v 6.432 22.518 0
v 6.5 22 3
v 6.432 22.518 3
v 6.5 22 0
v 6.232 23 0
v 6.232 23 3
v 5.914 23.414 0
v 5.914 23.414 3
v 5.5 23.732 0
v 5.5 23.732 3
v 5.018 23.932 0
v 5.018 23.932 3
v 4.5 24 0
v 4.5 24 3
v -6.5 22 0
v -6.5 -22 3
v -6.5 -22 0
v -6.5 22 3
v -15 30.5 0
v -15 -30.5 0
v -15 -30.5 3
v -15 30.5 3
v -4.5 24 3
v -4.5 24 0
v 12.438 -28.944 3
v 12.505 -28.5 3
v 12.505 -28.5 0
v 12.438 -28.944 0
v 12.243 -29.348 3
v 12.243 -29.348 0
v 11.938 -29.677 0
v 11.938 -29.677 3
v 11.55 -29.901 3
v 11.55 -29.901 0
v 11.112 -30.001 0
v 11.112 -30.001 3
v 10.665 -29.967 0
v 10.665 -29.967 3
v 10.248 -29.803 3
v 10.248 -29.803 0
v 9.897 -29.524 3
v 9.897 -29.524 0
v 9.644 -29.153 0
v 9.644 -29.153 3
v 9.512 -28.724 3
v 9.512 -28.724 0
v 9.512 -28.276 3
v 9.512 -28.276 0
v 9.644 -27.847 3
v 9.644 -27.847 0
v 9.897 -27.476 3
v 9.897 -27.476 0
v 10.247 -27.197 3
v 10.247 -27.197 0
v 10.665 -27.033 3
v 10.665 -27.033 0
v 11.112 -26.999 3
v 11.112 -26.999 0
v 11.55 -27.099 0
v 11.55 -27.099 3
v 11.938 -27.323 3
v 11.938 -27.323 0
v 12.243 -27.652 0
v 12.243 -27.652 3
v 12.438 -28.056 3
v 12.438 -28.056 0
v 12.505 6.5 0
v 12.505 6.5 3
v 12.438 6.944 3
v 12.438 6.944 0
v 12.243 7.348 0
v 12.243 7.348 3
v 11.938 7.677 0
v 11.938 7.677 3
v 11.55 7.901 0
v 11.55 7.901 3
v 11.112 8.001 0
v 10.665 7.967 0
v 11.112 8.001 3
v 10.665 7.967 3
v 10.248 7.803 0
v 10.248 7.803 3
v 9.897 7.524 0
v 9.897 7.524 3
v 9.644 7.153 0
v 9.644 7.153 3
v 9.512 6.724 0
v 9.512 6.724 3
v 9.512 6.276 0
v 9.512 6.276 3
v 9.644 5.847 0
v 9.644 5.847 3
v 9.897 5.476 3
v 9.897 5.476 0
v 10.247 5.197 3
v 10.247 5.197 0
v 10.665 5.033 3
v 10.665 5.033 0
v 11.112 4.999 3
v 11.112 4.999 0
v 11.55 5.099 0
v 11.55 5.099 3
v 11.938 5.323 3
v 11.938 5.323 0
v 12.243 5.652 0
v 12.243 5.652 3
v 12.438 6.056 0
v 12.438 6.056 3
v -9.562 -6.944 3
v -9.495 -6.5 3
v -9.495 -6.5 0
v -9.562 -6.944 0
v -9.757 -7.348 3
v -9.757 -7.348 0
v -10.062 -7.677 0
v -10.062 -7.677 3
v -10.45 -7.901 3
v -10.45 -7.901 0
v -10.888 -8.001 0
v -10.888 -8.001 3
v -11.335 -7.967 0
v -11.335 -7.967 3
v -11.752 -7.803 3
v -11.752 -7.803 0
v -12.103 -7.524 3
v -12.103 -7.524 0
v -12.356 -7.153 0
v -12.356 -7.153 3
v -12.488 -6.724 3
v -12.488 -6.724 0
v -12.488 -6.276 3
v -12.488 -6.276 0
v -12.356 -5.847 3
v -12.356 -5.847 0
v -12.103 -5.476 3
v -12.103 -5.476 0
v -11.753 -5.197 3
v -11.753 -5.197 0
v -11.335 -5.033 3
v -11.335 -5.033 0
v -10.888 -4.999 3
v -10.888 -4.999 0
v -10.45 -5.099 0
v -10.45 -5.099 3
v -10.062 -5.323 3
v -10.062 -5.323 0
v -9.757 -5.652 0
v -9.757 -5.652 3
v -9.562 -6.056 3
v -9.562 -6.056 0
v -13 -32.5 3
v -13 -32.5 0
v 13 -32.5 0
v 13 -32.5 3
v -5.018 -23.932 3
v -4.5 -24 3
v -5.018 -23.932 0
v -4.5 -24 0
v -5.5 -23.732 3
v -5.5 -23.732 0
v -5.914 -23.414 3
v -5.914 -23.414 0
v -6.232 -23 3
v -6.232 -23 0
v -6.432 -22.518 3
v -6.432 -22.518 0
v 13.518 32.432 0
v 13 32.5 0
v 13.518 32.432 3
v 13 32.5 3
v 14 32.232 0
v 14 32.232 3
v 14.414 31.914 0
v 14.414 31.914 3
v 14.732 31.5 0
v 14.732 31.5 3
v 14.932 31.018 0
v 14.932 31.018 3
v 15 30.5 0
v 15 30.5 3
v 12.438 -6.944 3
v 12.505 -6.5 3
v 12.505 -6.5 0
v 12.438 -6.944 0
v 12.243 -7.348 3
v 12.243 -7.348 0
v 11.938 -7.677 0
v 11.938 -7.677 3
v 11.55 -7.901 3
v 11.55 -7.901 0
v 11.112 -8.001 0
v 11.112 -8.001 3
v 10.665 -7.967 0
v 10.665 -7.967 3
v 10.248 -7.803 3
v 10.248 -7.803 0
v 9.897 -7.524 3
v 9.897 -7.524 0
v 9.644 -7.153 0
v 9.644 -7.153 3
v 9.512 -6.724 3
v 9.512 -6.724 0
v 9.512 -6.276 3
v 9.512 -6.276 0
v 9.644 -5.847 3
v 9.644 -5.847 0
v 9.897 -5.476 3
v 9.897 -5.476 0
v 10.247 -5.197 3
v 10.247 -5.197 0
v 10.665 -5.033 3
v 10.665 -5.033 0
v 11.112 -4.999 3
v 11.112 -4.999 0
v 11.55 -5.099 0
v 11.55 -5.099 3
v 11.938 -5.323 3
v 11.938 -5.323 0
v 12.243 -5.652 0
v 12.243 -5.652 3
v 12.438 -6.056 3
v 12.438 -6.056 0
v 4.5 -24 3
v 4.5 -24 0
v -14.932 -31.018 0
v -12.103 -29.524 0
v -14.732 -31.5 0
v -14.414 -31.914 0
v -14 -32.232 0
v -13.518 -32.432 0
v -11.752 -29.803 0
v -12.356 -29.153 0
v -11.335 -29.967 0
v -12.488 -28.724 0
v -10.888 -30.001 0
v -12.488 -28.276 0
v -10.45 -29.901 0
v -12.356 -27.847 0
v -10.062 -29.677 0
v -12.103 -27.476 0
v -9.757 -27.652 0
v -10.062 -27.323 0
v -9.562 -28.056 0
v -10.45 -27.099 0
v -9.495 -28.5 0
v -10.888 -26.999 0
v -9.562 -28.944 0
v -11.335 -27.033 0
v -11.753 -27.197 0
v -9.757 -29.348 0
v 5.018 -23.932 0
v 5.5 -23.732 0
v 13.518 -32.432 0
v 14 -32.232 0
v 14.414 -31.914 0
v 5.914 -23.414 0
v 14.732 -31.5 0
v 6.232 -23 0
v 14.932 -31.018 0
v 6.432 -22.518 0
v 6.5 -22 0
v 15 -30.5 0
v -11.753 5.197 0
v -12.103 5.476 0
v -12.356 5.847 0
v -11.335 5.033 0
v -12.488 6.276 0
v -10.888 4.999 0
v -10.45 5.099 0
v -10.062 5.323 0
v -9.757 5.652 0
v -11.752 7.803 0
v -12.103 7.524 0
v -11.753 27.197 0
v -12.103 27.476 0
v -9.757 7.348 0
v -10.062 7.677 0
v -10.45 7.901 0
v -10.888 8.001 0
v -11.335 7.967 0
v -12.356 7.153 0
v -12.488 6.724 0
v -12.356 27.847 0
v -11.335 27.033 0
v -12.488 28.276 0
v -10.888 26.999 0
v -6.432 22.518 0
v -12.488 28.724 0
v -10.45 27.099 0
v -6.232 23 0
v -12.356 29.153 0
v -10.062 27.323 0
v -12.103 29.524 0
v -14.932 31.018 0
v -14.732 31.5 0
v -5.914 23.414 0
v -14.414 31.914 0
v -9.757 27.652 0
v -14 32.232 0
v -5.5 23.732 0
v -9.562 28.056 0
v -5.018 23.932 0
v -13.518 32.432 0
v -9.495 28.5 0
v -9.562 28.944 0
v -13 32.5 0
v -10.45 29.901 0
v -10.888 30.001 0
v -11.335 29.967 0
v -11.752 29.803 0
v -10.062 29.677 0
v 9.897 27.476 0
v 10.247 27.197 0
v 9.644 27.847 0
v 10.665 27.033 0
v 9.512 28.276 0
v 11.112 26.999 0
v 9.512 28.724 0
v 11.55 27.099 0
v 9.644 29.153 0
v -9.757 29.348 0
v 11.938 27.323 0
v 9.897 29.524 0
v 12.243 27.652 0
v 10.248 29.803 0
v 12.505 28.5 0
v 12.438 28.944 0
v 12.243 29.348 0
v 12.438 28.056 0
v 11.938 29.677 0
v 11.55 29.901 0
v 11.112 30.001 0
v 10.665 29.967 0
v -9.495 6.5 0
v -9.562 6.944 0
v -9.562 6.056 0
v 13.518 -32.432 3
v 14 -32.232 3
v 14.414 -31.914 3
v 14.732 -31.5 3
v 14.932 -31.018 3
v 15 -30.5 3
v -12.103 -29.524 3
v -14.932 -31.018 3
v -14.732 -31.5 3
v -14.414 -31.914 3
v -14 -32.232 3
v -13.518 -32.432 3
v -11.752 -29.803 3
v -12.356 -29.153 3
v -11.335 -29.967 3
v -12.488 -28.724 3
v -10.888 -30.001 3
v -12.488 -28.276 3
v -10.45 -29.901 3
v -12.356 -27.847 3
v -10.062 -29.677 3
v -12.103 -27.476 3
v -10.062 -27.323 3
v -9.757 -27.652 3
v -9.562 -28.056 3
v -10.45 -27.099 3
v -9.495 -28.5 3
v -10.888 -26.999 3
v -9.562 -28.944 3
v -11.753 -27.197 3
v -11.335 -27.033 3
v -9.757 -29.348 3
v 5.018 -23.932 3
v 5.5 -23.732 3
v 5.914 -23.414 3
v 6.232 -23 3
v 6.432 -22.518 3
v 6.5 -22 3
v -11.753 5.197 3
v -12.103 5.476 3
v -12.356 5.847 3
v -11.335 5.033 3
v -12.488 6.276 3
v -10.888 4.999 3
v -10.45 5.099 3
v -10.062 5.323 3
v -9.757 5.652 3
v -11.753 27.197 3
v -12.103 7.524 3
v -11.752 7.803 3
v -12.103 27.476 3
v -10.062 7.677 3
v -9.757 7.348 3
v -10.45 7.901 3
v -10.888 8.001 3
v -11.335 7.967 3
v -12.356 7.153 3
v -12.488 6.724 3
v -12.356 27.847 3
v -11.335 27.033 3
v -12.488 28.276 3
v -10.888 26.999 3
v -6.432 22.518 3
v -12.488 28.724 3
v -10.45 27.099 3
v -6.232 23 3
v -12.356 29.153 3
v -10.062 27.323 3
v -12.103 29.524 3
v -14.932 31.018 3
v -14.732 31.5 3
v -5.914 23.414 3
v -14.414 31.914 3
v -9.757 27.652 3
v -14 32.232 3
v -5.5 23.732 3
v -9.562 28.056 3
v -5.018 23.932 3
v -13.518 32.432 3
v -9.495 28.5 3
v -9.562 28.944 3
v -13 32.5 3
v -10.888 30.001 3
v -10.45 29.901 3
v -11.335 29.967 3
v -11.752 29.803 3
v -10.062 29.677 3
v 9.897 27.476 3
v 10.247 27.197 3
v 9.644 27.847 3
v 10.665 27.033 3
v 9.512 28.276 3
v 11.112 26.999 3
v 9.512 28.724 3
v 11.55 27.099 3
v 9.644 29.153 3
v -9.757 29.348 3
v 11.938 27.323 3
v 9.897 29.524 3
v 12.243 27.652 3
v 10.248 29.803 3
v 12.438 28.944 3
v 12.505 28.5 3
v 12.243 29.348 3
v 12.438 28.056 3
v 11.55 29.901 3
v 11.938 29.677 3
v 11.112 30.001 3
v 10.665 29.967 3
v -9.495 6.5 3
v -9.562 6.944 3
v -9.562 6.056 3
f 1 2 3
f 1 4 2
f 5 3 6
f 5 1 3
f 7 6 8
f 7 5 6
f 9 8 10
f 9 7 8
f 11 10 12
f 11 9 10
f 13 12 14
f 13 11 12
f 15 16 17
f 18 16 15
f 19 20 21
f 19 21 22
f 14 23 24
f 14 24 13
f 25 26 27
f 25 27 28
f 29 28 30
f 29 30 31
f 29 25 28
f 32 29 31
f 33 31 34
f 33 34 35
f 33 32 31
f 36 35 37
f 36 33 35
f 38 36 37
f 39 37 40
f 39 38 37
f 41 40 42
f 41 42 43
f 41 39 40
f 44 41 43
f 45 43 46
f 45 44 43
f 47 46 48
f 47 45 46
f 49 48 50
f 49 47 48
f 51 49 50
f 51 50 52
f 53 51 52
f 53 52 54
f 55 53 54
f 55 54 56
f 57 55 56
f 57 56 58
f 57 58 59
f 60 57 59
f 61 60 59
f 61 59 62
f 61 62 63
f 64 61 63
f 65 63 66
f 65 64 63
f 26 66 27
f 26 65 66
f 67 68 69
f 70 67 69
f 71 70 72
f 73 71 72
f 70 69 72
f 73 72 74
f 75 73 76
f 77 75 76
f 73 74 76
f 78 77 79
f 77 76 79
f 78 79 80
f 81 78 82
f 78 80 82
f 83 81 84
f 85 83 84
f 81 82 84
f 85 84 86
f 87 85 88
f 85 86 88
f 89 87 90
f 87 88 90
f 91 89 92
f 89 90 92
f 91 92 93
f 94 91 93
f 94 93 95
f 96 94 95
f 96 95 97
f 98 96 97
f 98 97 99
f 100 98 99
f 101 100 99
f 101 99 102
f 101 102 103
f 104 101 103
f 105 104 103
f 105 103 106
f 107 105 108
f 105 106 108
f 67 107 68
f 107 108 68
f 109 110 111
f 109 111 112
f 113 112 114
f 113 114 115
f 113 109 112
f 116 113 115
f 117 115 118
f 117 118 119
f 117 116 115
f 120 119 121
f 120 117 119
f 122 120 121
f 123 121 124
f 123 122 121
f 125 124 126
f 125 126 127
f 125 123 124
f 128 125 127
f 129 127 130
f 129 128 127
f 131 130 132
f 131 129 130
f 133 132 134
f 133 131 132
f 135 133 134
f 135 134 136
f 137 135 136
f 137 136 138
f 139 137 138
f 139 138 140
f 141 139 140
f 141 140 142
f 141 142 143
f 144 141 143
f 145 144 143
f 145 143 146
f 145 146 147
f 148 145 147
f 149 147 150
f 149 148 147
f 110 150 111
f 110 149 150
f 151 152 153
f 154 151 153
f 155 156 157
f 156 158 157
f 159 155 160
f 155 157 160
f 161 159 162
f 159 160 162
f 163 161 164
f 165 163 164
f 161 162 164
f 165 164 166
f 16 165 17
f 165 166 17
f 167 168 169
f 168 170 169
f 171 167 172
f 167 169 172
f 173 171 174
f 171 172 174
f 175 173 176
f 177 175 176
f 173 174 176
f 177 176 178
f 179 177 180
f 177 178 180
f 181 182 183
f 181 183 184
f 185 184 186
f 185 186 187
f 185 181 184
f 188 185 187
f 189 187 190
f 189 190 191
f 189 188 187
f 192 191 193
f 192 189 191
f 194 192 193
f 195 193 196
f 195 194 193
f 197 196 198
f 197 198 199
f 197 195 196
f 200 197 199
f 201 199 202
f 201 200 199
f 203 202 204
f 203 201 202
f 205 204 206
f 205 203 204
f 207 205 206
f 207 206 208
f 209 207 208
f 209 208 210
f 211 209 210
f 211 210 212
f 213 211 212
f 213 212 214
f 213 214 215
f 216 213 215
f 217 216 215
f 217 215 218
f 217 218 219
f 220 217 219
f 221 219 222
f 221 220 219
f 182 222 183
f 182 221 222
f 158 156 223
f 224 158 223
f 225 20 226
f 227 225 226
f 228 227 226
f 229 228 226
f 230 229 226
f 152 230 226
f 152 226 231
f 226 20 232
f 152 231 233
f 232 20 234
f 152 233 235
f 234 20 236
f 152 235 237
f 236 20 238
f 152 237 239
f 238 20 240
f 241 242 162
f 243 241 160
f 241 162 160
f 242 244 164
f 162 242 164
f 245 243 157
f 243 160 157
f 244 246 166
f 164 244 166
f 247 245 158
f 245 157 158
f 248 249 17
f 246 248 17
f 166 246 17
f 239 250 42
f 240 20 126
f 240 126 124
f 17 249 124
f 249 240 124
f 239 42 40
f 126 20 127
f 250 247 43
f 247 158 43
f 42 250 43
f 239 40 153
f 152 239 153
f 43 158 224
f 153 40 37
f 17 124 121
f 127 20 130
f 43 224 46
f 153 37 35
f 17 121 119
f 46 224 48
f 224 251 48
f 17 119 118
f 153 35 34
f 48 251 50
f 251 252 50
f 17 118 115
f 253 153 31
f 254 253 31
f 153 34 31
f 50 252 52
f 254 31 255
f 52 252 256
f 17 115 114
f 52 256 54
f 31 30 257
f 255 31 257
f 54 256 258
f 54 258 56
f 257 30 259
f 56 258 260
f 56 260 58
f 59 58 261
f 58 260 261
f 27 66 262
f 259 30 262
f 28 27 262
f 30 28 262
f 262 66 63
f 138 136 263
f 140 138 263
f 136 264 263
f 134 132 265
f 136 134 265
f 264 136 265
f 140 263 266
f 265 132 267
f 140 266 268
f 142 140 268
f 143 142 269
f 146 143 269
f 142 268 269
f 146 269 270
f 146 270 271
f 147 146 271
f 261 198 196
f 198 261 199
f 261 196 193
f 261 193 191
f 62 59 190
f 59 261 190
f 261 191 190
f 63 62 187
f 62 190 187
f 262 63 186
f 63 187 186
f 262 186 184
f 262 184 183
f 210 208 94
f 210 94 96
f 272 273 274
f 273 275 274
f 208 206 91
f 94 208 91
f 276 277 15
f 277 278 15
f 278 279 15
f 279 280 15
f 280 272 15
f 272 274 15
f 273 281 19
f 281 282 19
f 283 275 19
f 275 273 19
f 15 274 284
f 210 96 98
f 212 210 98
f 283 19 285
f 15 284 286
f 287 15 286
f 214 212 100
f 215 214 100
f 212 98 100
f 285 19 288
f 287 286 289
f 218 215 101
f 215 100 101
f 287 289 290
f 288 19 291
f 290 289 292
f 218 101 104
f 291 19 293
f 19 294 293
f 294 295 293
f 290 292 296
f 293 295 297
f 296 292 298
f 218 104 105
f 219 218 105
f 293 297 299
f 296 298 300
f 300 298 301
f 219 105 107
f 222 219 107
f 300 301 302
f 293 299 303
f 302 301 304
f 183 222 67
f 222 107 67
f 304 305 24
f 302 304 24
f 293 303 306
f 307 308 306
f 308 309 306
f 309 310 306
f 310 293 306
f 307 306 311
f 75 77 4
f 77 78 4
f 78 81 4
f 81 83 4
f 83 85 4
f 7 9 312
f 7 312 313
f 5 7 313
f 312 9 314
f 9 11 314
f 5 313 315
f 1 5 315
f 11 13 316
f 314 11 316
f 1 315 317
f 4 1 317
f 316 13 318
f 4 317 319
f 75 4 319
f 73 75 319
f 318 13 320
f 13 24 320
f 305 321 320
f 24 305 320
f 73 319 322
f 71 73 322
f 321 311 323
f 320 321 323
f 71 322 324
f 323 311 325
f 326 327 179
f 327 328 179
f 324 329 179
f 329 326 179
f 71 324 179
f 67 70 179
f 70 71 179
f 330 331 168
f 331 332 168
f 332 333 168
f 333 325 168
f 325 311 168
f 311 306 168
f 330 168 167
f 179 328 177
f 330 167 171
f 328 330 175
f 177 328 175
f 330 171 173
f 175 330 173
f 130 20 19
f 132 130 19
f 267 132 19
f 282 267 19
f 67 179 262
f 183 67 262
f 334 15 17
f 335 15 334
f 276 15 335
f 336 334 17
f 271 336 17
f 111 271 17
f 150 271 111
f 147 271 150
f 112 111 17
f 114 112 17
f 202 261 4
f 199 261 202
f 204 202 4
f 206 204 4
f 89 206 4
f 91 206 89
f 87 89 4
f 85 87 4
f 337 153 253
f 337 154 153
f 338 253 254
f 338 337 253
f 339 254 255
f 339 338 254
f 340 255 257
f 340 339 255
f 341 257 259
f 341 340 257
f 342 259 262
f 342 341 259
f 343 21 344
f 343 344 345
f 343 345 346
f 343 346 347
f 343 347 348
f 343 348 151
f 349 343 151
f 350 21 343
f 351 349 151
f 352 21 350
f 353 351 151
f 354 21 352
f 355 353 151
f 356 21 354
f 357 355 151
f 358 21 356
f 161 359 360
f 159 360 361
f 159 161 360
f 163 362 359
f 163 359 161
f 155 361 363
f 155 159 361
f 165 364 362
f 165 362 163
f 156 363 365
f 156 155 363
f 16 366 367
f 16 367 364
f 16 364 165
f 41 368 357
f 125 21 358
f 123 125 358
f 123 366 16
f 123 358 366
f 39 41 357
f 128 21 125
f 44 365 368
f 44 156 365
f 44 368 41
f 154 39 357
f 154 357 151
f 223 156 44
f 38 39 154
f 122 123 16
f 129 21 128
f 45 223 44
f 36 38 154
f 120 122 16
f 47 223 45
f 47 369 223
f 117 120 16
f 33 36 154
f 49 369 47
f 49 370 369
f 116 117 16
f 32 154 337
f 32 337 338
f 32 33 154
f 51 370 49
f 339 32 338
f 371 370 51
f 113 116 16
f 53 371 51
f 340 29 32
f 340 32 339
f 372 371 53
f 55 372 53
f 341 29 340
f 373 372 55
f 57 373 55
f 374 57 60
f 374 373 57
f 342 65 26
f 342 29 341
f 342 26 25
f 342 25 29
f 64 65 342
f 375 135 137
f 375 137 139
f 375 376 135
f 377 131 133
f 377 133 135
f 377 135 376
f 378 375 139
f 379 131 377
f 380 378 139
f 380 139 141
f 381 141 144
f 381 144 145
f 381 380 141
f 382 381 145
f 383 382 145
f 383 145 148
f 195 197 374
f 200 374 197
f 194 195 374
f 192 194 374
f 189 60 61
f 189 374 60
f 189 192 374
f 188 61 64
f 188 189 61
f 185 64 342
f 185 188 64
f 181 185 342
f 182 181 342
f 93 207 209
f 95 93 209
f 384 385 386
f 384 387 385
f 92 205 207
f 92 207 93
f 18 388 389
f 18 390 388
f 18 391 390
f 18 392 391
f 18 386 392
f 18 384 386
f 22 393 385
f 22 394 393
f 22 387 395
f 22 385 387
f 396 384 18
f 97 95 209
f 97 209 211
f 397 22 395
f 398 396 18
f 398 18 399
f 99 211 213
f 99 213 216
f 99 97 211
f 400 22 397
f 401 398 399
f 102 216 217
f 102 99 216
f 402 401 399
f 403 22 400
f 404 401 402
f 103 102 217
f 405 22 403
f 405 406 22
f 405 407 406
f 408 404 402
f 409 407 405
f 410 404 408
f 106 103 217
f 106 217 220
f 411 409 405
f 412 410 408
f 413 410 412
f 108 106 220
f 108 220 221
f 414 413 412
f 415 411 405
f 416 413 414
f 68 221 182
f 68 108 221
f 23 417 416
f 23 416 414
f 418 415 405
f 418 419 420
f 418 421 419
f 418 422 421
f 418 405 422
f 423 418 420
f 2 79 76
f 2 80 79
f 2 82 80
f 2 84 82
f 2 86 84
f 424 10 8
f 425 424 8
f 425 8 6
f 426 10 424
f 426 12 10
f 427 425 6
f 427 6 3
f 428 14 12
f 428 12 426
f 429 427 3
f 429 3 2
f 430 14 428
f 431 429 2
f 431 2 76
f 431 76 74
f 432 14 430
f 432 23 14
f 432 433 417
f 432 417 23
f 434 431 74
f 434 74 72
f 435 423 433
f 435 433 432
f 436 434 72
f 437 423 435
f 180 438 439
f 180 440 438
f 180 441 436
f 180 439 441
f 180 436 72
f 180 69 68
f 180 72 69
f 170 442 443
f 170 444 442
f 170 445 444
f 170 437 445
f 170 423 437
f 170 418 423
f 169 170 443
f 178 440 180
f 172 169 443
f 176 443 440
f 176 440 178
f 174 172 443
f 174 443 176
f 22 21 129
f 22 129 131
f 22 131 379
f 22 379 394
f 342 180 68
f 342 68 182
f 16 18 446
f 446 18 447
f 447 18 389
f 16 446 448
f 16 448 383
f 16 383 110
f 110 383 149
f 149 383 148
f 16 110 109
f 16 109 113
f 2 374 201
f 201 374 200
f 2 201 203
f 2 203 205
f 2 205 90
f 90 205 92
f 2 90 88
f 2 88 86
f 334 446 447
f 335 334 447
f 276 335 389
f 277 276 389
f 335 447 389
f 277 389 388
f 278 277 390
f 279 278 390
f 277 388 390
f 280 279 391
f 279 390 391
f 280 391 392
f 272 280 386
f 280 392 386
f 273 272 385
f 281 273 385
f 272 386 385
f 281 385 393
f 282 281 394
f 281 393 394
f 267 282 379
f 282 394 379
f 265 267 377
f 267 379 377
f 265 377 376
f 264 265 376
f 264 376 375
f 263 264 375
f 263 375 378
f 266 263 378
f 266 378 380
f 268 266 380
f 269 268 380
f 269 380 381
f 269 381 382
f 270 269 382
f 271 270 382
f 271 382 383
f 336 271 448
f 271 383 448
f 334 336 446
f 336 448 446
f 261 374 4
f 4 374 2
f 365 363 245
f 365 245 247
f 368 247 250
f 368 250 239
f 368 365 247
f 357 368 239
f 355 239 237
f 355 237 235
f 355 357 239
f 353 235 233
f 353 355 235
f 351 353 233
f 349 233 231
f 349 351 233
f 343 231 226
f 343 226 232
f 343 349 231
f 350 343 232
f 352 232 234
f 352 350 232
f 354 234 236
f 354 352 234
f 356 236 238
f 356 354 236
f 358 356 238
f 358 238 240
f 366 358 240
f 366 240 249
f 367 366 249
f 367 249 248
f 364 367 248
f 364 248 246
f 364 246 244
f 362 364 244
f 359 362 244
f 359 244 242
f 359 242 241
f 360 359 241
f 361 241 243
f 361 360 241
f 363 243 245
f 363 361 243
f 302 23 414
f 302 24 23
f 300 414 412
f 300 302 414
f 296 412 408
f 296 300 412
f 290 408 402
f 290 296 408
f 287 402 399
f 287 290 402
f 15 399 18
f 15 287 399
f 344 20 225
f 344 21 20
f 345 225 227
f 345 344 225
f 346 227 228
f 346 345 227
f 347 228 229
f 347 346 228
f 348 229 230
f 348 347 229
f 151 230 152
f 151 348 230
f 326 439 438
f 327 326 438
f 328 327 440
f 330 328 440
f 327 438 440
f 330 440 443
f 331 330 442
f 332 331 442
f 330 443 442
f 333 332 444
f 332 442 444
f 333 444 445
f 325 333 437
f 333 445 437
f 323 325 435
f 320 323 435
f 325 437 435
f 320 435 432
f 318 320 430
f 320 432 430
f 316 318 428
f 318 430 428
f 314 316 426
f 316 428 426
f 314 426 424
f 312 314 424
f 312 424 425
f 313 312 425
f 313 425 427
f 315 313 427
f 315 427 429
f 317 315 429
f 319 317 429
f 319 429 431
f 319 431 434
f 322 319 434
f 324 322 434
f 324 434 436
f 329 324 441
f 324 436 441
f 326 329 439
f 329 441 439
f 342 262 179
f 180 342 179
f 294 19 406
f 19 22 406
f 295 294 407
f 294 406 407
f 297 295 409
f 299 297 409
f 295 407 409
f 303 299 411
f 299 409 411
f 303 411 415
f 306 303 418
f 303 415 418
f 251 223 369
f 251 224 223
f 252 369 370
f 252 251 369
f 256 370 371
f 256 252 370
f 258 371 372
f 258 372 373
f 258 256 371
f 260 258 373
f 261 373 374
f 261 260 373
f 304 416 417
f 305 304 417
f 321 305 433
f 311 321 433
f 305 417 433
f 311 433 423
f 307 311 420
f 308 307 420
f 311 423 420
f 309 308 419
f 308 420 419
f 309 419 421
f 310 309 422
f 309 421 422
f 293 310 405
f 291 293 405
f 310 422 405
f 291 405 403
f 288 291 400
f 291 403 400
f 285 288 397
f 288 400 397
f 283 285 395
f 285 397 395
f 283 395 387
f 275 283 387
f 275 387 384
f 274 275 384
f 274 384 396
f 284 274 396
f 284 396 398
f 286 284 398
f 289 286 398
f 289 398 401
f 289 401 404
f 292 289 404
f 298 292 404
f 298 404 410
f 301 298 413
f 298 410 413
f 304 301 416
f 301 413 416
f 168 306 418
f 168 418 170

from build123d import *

# Parameters (mm, degrees)
SKETCH_1_W          = 30
SKETCH_1_H          = 65
EXTRUDE_1_DEPTH     = 3
SKETCH_2_R          = 1.505
CUT_EXTRUDE_1_DEPTH = 3
FILLET_1_R          = 2
SKETCH_3_W          = 13
SKETCH_3_H          = 48
CUT_EXTRUDE_2_DEPTH = 10
FILLET_2_R          = 2


with BuildPart() as part:
    # 草图1 → 凸台-拉伸1 (new body)
    with BuildSketch(Plane.XY):
        Rectangle(SKETCH_1_W, SKETCH_1_H)
    extrude(amount=EXTRUDE_1_DEPTH)

    # 草图2 → 切除-拉伸1 (cut)
    with BuildSketch(Plane.XY.offset(3)):
        with Locations((-11, 28.5)):
            Circle(SKETCH_2_R)
        with Locations((11, 28.5)):
            Circle(SKETCH_2_R)
        with Locations((-11, 6.5)):
            Circle(SKETCH_2_R)
        with Locations((11, 6.5)):
            Circle(SKETCH_2_R)
    cut_extrude_1 = extrude(amount=-CUT_EXTRUDE_1_DEPTH, mode=Mode.SUBTRACT)

    # 镜向1: 切除-拉伸1 across plane
    add(cut_extrude_1.mirror(Plane.ZX), mode=Mode.SUBTRACT)

    # 圆角1
    fillet_1_edges = [part.edges().sort_by_distance(p)[0] for p in [
        (15, -32.5, 1.5),
        (-15, -32.5, 1.5),
        (-15, 32.5, 1.5),
        (15, 32.5, 1.5),
    ]]
    fillet(fillet_1_edges, radius=FILLET_1_R)

    # 草图3 → 切除-拉伸2 (cut)
    with BuildSketch(Plane.XY.offset(3)):
        Rectangle(SKETCH_3_W, SKETCH_3_H)
    extrude(amount=-CUT_EXTRUDE_2_DEPTH, mode=Mode.SUBTRACT)

    # 圆角2
    fillet_2_edges = [part.edges().sort_by_distance(p)[0] for p in [
        (6.5, 24, 1.5),
        (6.5, -24, 1.5),
        (-6.5, -24, 1.5),
        (-6.5, 24, 1.5),
    ]]
    fillet(fillet_2_edges, radius=FILLET_2_R)


solid = part.part
